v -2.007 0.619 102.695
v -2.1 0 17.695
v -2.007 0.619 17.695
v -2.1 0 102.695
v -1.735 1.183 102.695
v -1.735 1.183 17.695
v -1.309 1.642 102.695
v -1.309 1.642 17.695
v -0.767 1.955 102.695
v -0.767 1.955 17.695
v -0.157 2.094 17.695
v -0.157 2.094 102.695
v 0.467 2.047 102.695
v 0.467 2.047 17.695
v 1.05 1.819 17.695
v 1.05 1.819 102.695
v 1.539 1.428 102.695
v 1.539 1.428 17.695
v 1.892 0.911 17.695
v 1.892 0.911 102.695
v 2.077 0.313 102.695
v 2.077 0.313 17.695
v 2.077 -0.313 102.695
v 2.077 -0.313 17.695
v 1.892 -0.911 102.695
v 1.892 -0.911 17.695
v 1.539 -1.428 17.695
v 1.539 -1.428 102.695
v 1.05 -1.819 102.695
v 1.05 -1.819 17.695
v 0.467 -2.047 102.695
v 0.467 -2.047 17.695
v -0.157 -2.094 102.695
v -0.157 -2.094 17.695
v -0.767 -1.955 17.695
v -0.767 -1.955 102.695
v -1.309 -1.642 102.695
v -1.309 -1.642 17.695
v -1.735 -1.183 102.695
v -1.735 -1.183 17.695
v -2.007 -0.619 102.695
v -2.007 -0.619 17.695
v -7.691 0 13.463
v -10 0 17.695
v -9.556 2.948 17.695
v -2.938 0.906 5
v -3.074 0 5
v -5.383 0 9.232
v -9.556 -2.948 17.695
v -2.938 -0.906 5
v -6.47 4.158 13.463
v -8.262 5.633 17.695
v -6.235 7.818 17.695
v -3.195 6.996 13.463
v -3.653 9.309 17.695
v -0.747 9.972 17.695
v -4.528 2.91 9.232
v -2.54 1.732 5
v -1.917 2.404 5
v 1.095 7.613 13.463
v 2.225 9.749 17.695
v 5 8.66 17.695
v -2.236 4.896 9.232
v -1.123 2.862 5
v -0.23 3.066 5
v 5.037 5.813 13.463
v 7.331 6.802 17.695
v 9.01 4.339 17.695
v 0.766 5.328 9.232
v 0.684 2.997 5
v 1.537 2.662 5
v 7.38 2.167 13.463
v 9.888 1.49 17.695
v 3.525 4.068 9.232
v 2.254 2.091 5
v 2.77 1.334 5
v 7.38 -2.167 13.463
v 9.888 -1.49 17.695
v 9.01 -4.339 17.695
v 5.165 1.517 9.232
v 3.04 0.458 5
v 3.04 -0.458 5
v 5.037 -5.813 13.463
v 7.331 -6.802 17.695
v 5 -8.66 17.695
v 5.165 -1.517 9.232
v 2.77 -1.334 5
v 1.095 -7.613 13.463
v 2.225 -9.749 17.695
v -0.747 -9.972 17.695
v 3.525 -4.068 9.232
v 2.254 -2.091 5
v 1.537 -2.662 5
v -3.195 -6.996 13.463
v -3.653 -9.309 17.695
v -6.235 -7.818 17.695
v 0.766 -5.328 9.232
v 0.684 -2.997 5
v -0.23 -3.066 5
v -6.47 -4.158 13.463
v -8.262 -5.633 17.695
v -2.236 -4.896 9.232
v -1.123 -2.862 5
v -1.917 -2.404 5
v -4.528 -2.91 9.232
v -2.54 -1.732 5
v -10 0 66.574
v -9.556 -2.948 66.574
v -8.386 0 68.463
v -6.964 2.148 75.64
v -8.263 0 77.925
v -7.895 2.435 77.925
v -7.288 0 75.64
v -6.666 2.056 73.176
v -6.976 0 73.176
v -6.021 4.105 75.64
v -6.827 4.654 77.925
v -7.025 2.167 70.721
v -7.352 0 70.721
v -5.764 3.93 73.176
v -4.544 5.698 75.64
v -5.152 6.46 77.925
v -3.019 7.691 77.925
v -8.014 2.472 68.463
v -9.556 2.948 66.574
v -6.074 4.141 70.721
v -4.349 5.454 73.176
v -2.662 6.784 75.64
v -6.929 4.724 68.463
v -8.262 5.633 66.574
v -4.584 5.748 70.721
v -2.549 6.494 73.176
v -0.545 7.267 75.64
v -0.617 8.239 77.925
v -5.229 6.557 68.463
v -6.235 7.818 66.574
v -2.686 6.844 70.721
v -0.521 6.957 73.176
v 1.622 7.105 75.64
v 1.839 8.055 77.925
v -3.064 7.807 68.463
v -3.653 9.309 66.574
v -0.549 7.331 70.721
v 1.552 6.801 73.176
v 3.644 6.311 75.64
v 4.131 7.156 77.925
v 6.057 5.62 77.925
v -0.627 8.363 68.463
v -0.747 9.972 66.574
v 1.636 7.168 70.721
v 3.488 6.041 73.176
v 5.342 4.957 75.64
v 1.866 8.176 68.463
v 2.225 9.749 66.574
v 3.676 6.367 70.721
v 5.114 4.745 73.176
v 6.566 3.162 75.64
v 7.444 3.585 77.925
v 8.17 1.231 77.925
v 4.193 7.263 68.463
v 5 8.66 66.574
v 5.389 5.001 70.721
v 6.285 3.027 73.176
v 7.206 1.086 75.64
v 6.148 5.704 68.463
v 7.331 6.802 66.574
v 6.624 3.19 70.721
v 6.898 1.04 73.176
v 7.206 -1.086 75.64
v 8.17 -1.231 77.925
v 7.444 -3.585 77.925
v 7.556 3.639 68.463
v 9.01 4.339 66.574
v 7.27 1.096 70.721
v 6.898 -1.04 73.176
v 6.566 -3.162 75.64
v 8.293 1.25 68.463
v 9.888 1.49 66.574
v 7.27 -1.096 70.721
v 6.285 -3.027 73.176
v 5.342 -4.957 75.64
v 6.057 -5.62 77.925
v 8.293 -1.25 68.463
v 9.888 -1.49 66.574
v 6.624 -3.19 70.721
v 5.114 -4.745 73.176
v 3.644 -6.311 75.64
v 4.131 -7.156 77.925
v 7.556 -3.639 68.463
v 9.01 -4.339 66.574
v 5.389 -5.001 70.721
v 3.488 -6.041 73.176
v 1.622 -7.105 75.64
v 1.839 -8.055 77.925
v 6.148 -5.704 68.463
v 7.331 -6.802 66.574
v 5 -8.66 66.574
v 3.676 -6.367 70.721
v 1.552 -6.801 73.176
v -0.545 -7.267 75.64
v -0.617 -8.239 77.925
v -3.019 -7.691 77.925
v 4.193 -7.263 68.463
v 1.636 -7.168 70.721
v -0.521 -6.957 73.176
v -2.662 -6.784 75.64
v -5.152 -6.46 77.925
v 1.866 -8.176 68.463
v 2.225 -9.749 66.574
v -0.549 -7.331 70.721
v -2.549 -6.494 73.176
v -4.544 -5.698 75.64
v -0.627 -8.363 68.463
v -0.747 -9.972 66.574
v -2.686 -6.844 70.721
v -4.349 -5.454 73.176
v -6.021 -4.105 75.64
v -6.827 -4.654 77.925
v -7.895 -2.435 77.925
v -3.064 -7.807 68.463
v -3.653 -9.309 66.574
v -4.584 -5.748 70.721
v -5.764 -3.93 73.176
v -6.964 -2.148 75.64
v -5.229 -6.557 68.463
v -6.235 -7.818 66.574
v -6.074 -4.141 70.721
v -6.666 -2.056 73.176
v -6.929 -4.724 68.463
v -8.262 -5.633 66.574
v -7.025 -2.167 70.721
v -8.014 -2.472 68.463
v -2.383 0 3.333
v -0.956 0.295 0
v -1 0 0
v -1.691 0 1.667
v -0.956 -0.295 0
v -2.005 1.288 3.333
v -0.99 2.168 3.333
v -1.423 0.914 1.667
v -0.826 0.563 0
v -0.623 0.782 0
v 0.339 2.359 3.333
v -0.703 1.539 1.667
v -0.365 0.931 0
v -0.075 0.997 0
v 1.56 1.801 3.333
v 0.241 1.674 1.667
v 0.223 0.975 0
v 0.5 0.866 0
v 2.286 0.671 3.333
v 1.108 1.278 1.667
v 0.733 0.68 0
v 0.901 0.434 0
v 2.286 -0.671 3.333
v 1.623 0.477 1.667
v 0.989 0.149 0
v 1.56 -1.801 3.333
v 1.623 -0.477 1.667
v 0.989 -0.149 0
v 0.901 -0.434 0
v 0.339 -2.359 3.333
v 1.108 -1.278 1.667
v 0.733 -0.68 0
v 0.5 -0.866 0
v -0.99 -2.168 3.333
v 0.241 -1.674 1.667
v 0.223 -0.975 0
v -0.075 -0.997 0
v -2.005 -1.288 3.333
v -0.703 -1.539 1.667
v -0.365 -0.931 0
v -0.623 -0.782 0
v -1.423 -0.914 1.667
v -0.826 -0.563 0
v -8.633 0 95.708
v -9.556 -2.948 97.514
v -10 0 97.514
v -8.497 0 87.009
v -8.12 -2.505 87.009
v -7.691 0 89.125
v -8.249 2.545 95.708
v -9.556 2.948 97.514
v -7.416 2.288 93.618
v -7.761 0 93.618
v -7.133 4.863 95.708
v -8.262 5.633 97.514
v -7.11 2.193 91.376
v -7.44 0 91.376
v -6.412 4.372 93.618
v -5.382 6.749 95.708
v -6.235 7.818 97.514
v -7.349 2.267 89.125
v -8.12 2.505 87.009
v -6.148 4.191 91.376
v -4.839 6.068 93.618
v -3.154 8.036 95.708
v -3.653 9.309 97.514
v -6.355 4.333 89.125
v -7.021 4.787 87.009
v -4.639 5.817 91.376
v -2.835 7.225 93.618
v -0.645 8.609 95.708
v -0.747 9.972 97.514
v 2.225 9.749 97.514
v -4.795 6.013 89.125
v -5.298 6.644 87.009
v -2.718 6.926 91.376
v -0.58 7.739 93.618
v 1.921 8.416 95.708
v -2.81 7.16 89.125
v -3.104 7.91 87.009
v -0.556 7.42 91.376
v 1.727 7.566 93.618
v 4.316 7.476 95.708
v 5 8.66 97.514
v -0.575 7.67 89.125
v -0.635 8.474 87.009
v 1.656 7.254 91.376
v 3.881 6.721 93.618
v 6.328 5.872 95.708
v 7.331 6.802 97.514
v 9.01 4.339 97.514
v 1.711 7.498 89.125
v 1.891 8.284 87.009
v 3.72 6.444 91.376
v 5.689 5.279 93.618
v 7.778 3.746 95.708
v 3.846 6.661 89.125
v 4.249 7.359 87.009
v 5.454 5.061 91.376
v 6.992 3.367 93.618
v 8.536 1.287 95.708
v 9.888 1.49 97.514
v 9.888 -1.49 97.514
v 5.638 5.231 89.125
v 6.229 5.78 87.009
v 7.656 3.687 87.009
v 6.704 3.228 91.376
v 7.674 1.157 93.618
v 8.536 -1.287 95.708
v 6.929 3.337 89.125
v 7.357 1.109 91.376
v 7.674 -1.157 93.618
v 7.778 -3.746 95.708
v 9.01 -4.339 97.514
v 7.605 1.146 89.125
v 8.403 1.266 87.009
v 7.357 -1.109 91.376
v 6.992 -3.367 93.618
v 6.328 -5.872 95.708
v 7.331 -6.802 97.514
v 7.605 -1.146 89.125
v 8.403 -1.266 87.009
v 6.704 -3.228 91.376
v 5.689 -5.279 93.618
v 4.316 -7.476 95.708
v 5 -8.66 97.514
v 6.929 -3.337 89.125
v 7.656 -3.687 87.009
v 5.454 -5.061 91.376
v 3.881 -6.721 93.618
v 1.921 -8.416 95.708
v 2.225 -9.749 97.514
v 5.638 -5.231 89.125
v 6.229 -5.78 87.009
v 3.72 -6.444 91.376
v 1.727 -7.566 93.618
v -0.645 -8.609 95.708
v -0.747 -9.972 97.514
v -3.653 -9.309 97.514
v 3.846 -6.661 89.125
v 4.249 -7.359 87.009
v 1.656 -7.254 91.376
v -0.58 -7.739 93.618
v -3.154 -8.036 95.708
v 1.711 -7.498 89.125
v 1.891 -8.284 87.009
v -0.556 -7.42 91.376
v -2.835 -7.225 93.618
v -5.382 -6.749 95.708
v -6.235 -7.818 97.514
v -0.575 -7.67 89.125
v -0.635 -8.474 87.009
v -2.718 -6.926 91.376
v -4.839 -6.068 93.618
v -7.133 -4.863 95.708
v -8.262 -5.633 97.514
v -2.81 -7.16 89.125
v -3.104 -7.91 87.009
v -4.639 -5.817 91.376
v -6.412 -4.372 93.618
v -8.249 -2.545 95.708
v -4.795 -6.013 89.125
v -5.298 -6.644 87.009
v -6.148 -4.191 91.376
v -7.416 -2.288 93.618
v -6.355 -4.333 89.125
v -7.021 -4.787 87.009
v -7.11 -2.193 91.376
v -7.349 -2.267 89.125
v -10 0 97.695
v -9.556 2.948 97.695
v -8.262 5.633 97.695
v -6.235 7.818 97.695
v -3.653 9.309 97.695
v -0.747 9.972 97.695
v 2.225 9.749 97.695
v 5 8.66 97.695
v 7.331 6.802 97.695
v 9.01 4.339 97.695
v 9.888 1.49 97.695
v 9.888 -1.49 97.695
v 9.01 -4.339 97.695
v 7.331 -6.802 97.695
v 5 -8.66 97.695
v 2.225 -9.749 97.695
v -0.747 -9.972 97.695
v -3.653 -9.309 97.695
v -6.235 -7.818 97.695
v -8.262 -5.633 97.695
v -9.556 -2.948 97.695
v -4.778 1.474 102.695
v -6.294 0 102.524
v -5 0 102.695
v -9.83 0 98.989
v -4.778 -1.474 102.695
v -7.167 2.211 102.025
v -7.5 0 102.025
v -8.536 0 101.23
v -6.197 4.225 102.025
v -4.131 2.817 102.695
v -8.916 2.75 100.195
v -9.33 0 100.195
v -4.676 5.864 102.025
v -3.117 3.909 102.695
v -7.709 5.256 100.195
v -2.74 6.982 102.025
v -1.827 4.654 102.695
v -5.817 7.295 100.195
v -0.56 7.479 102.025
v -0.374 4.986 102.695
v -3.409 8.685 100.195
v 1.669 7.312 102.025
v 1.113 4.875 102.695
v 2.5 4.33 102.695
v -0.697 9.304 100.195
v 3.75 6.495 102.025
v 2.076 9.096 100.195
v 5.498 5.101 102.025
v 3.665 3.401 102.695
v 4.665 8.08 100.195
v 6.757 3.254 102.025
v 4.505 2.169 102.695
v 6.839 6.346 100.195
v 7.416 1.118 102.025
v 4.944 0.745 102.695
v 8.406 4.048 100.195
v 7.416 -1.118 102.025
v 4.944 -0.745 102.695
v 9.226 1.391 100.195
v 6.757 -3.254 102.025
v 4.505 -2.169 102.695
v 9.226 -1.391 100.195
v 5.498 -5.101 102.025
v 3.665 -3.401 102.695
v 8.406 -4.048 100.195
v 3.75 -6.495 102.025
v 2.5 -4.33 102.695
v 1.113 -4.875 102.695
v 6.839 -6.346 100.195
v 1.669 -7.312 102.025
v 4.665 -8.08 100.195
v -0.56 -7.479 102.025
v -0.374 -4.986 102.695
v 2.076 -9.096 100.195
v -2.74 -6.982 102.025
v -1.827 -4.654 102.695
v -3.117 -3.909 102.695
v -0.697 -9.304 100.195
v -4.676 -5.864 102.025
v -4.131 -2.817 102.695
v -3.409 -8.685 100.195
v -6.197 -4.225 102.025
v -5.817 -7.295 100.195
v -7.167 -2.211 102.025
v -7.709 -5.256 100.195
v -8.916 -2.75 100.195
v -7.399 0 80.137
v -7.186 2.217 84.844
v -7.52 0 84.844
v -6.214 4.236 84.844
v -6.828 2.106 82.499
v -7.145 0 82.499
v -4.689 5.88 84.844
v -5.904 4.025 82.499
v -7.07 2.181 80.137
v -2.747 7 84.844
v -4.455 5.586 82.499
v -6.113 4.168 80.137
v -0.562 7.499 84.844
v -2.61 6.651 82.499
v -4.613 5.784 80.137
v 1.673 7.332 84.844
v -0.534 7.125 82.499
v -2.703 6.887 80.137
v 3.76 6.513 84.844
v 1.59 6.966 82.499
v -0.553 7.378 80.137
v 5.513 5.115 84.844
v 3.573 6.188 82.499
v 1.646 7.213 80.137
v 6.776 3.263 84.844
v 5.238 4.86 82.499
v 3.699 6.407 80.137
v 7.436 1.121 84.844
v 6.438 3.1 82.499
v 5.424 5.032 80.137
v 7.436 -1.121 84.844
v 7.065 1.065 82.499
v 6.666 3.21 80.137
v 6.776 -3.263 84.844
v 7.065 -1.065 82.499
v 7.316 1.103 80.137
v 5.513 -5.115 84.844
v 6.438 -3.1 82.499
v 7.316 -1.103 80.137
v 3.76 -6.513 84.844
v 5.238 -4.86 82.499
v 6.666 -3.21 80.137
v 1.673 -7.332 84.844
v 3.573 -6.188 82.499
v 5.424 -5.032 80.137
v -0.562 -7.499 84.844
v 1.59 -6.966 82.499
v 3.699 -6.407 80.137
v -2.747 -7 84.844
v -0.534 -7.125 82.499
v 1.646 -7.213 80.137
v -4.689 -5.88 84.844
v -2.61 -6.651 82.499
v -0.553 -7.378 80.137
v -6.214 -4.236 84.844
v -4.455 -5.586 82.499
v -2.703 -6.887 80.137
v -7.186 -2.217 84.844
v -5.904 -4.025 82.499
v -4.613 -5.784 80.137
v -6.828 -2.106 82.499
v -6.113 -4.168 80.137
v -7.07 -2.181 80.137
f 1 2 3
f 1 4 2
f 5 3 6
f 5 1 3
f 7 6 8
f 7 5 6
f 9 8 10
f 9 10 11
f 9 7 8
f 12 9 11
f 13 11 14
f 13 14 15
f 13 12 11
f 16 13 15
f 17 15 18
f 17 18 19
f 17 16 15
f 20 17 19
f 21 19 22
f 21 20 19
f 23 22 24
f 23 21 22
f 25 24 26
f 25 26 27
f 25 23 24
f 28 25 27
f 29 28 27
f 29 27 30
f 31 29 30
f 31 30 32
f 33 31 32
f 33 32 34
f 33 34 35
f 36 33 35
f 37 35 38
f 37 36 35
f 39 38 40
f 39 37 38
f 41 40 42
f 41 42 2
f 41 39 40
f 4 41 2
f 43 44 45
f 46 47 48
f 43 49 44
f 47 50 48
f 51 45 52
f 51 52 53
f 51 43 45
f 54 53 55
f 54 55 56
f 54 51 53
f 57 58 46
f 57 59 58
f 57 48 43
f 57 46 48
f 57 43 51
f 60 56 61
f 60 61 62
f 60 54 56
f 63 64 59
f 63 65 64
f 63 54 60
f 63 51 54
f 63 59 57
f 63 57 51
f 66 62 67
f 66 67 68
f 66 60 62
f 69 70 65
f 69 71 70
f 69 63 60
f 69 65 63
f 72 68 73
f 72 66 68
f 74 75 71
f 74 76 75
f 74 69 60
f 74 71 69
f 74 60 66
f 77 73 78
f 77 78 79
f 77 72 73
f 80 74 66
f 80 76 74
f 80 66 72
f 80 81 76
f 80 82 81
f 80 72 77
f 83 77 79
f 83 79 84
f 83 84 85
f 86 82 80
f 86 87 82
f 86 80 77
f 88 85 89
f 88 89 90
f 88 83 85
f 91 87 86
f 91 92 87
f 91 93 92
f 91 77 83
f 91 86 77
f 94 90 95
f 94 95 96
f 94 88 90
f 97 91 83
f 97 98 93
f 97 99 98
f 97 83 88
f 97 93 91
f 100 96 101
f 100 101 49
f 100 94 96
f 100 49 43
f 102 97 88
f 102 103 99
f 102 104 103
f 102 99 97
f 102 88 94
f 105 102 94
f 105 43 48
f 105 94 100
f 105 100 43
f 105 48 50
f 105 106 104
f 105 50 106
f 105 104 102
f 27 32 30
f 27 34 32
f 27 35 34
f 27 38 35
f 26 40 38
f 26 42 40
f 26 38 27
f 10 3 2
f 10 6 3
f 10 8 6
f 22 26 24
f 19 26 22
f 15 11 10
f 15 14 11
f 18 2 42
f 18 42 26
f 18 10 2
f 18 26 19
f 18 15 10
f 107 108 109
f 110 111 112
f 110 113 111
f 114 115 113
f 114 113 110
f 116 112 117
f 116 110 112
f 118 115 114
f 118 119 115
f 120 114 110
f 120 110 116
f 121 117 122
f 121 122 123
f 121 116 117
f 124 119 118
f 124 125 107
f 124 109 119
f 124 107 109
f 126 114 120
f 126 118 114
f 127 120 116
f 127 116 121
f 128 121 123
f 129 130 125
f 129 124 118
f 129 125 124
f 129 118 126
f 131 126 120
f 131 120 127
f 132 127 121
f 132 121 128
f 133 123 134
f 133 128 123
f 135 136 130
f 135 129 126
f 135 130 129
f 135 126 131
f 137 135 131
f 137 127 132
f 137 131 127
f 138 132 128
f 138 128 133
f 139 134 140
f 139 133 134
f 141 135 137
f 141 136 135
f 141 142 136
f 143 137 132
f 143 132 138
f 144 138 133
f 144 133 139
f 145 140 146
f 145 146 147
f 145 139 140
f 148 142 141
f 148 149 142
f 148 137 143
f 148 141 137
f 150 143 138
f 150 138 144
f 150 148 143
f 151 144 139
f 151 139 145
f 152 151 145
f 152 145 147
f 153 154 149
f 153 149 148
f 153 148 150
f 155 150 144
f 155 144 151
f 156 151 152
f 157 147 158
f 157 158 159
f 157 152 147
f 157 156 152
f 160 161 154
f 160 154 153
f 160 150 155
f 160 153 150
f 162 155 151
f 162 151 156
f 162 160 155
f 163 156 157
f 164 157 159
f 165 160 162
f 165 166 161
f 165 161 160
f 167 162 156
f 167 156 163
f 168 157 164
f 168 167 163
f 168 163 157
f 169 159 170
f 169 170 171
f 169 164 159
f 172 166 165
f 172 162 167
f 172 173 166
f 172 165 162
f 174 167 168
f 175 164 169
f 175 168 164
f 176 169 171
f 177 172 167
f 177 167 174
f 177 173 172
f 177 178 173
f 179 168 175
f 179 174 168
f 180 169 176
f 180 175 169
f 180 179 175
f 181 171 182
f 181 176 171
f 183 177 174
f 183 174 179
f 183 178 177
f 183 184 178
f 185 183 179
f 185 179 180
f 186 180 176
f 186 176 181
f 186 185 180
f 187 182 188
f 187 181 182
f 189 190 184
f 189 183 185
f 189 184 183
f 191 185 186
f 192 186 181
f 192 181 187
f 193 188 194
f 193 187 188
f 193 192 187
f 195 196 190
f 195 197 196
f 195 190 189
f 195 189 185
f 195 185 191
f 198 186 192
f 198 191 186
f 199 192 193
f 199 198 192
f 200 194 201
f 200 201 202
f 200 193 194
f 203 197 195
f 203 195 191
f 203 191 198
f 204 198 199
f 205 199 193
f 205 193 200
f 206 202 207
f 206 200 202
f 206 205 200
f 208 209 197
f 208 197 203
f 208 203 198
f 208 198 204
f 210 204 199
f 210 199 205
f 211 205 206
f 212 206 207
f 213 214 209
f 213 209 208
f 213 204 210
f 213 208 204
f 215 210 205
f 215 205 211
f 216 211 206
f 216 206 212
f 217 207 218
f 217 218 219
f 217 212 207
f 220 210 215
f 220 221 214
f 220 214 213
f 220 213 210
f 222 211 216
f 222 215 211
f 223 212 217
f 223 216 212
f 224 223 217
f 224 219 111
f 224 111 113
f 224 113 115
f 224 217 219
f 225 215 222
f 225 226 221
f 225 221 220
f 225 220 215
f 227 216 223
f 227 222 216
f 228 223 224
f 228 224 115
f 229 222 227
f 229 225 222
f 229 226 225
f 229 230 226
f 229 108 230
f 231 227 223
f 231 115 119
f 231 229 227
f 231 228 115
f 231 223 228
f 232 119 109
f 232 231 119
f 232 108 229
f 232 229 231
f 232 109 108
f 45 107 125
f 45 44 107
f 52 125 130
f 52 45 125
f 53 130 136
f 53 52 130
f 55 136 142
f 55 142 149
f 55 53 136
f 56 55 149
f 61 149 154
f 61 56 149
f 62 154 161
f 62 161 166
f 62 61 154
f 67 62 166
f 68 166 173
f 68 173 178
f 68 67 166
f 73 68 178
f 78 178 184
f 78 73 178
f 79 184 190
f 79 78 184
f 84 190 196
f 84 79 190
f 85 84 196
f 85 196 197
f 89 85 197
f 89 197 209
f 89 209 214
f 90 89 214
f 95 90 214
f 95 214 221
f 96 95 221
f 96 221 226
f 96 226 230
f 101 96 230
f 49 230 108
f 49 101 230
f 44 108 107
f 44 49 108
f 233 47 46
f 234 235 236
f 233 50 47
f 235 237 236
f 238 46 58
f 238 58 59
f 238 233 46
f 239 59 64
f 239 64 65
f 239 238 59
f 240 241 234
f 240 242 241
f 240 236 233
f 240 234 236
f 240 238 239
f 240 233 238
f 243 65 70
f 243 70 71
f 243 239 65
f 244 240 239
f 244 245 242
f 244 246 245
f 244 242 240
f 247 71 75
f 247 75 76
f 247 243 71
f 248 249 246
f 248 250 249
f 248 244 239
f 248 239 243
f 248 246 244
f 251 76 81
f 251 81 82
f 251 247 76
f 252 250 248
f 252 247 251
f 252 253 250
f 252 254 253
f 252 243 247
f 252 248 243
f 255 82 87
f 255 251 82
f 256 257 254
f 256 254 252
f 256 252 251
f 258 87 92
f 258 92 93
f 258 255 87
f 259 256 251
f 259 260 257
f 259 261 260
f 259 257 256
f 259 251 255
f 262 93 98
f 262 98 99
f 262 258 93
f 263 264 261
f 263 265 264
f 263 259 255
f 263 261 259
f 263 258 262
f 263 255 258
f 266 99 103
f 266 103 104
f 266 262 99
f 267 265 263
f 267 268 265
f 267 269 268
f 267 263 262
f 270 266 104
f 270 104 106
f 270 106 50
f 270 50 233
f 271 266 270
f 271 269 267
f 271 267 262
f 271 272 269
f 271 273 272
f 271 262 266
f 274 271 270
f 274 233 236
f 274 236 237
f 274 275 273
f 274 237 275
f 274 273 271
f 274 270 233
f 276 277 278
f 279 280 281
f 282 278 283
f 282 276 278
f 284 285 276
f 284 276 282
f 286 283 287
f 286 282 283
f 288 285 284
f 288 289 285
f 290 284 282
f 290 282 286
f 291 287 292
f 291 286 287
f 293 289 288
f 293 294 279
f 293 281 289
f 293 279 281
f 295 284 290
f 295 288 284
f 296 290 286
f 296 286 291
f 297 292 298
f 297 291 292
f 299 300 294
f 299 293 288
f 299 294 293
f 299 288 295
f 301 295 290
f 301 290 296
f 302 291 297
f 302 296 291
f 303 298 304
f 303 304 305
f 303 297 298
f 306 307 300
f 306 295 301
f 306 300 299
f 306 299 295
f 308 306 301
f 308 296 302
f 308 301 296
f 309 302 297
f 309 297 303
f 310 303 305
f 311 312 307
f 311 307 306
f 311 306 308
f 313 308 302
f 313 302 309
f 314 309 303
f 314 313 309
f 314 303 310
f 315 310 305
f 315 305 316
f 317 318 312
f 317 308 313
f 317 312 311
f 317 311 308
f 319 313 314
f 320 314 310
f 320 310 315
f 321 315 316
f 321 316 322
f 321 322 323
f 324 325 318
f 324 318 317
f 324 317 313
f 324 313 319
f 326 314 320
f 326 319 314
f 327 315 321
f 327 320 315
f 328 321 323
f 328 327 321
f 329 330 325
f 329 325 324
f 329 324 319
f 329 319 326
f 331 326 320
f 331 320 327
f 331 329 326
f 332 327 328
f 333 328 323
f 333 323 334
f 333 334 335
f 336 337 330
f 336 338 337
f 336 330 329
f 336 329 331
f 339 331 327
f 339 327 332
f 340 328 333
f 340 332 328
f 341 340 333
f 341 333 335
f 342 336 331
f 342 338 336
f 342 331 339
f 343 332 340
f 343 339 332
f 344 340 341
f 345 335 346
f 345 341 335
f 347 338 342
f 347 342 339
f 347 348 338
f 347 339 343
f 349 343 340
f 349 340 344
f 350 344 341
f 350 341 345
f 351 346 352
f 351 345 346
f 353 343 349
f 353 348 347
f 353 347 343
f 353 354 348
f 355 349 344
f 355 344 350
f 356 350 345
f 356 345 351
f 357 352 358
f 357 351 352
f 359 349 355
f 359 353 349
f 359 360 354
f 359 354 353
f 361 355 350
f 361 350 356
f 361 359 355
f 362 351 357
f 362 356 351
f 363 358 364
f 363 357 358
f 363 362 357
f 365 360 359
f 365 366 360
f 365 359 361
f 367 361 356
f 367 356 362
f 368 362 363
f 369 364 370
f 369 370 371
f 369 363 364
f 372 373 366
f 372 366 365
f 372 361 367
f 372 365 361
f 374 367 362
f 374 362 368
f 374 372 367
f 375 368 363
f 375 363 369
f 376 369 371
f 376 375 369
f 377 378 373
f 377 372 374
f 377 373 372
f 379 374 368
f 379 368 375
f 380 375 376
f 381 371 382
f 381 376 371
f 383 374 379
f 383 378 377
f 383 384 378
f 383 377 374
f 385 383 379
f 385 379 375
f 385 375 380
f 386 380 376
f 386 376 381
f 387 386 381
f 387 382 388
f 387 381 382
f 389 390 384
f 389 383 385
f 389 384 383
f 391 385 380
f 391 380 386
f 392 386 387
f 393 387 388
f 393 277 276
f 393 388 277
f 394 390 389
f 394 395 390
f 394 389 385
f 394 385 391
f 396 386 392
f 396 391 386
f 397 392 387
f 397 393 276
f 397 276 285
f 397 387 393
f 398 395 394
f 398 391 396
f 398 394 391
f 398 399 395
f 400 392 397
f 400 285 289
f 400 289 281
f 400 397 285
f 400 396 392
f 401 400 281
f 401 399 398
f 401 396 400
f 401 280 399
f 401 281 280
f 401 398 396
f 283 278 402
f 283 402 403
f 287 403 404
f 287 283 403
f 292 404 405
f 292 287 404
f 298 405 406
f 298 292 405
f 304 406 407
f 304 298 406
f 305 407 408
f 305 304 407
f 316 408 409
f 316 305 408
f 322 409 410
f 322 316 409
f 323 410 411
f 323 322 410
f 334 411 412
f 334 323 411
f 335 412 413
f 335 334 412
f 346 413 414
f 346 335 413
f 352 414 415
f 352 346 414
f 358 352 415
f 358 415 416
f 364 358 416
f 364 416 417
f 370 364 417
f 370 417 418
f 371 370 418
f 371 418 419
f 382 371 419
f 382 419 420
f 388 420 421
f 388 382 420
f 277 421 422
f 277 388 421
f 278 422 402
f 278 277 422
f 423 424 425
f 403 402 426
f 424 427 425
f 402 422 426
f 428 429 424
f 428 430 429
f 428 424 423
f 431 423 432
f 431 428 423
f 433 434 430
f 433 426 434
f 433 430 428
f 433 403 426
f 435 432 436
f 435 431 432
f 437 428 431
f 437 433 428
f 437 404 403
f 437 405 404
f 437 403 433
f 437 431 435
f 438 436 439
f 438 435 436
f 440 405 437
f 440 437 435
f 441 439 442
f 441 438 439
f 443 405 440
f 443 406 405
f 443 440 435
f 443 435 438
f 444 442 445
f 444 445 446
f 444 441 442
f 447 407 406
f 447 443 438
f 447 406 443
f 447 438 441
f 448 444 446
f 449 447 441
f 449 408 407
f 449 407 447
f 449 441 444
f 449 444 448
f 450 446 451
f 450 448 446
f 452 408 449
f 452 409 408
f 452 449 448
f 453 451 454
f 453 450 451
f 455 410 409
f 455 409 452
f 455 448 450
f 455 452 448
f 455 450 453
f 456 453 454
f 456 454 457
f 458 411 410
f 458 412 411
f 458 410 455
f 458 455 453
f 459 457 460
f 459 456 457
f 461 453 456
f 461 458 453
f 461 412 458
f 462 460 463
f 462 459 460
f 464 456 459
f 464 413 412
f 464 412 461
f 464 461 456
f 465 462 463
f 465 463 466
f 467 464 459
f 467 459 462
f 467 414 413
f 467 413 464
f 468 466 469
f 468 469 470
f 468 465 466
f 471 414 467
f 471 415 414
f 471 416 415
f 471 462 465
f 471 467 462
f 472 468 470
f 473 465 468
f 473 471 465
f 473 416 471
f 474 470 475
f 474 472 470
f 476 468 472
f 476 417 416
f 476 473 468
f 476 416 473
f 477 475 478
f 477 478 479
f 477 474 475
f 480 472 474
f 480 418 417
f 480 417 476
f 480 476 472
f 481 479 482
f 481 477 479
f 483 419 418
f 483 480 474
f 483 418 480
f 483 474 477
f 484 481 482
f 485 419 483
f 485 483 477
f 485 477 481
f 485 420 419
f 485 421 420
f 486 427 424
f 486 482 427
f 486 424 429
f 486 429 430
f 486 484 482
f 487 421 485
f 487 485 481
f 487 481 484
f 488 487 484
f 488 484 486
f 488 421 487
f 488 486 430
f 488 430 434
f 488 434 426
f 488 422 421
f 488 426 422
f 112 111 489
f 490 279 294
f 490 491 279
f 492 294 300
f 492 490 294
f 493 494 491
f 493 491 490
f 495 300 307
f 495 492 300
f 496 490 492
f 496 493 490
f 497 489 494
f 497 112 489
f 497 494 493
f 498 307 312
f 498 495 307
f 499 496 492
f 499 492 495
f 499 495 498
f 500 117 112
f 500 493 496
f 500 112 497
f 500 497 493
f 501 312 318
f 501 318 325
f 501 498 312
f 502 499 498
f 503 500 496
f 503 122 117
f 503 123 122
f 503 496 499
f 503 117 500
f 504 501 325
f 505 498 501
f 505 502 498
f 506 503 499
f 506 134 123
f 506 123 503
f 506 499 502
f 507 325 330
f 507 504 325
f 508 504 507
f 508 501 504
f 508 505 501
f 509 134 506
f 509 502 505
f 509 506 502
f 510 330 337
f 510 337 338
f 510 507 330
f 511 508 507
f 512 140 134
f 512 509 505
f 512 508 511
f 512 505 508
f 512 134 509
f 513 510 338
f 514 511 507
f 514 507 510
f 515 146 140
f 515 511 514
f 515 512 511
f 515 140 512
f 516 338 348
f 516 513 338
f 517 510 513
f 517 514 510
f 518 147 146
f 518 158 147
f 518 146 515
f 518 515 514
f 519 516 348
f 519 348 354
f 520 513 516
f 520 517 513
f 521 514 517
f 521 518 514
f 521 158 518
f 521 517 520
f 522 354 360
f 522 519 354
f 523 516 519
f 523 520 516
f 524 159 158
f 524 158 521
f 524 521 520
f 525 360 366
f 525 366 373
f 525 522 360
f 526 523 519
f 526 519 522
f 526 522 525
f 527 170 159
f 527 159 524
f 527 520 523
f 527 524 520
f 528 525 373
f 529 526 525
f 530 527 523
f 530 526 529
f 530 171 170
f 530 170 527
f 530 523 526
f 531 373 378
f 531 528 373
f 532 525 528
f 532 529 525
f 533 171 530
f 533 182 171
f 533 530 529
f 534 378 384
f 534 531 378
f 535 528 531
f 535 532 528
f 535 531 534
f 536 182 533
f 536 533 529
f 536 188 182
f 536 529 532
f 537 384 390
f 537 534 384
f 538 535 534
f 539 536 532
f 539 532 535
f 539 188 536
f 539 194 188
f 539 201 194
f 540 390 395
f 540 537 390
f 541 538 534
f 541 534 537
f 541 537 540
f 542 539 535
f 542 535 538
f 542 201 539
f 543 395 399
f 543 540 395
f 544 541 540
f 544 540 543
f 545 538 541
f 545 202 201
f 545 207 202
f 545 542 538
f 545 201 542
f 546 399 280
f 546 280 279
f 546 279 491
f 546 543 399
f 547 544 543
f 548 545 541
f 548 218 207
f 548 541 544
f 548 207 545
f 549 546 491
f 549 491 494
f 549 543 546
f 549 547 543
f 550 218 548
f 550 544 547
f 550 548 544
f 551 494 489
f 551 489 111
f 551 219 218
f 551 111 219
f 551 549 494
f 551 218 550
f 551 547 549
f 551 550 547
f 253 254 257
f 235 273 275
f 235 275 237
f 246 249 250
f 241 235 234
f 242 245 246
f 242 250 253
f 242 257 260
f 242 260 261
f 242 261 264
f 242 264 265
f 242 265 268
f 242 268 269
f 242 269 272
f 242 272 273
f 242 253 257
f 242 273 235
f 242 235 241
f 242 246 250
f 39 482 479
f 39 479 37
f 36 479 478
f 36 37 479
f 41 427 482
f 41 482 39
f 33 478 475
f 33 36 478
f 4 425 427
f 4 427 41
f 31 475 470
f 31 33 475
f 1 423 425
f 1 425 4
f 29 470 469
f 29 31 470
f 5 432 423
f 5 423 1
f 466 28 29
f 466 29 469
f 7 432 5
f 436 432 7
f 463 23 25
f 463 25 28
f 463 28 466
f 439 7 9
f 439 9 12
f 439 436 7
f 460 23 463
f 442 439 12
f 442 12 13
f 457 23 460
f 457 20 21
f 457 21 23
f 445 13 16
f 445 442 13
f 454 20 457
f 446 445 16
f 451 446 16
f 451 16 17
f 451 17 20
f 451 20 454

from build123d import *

# Parameters (mm, degrees)
F2_R = 5


with BuildPart() as f1:
    # F0 (on Front) → F1 (revolve)
    with BuildSketch(Plane.XZ):
        with BuildLine():
            Line((-3.074385, 5), (-1, 0))
            Line((-1, 0), (0, 0))
            Line((0, 0), (0, 17.69474))
            Line((0, 17.69474), (-2.1, 17.69474))
            Line((-2.1, 17.69474), (-2.1, 102.69474))
            Line((-2.1, 102.69474), (-10, 102.69474))
            Line((-10, 102.69474), (-10, 97.513927))
            ThreePointArc((-10, 97.513927), (-7.529704, 92.507199), (-8.497441, 87.00873))
            ThreePointArc((-8.497441, 87.00873), (-7.145288, 82.498591), (-8.262521, 77.924594))
            ThreePointArc((-8.262521, 77.924594), (-7.078613, 71.935289), (-10, 66.574422))
            Line((-10, 66.574422), (-10, 17.69474))
            Line((-10, 17.69474), (-3.074385, 5))
        make_face()
    revolve(axis=Axis((0, 0, 8.84737), (0, 0, -1)))

    # F2
    f2_edges = [f1.edges().sort_by_distance(p)[0] for p in [
        (10, 0, 102.69474),
    ]]
    fillet(f2_edges, radius=F2_R)


solid = f1.part
